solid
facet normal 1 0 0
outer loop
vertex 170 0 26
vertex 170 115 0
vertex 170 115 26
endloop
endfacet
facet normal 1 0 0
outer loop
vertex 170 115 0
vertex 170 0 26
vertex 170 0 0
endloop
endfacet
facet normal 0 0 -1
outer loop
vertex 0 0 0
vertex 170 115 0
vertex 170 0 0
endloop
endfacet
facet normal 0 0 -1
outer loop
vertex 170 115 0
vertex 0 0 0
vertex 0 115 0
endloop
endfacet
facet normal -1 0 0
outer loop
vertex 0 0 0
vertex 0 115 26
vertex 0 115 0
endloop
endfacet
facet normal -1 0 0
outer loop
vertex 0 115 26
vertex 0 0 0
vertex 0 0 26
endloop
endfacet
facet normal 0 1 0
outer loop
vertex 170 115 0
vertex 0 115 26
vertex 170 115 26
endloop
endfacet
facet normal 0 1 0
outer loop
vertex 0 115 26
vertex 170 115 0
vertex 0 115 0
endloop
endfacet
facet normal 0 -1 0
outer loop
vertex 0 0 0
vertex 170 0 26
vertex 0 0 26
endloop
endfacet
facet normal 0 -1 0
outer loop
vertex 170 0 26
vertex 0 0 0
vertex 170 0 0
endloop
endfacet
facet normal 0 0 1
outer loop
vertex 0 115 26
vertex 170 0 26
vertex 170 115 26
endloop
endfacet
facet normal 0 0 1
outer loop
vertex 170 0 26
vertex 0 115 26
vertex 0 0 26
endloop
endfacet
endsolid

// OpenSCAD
// file: back.scad
// Back piece — electronics + battery cavities, button holes on side edge
// TODO: implement cavity and button-hole geometry
include <params.scad>

module back() {
    // Stub: solid back slab
    cube([case_w, case_h, case_d / 2]);
}

back();
// file: front.scad
// Front piece — display bezel with cutout
// TODO: implement display cutout geometry
include <params.scad>

module front() {
    // Stub: solid front slab
    cube([case_w, case_h, case_d / 2]);
}

front();
// file: params.scad
// Case dimensions from build guide
// Overall envelope
case_w = 170;   // width  (mm) — display width + margins
case_h = 115;   // height (mm) — display height + margins
case_d = 26;    // depth  (mm) — uniform front-to-back

// Display cutout (front face)
display_w = 163; // display opening width  (mm)
display_h = 98;  // display opening height (mm)

// Cavity depths (back half)
battery_depth    = 6;   // battery cavity depth  (mm)
electronics_depth = 22; // electronics cavity depth (mm)

// Derived: wall thickness — raw expression gives -1mm with current dimensions
// (26 - 6 - 22) / 2 = -1; clamped to min_wall. Increase case_d for real geometry.
min_wall = 1;
wall = max(min_wall, (case_d - battery_depth - electronics_depth) / 2);
// main file
// Assembly — front + back positioned for visual inspection
include <params.scad>
use <front.scad>
use <back.scad>

front();

translate([0, 0, case_d / 2])
    back();
